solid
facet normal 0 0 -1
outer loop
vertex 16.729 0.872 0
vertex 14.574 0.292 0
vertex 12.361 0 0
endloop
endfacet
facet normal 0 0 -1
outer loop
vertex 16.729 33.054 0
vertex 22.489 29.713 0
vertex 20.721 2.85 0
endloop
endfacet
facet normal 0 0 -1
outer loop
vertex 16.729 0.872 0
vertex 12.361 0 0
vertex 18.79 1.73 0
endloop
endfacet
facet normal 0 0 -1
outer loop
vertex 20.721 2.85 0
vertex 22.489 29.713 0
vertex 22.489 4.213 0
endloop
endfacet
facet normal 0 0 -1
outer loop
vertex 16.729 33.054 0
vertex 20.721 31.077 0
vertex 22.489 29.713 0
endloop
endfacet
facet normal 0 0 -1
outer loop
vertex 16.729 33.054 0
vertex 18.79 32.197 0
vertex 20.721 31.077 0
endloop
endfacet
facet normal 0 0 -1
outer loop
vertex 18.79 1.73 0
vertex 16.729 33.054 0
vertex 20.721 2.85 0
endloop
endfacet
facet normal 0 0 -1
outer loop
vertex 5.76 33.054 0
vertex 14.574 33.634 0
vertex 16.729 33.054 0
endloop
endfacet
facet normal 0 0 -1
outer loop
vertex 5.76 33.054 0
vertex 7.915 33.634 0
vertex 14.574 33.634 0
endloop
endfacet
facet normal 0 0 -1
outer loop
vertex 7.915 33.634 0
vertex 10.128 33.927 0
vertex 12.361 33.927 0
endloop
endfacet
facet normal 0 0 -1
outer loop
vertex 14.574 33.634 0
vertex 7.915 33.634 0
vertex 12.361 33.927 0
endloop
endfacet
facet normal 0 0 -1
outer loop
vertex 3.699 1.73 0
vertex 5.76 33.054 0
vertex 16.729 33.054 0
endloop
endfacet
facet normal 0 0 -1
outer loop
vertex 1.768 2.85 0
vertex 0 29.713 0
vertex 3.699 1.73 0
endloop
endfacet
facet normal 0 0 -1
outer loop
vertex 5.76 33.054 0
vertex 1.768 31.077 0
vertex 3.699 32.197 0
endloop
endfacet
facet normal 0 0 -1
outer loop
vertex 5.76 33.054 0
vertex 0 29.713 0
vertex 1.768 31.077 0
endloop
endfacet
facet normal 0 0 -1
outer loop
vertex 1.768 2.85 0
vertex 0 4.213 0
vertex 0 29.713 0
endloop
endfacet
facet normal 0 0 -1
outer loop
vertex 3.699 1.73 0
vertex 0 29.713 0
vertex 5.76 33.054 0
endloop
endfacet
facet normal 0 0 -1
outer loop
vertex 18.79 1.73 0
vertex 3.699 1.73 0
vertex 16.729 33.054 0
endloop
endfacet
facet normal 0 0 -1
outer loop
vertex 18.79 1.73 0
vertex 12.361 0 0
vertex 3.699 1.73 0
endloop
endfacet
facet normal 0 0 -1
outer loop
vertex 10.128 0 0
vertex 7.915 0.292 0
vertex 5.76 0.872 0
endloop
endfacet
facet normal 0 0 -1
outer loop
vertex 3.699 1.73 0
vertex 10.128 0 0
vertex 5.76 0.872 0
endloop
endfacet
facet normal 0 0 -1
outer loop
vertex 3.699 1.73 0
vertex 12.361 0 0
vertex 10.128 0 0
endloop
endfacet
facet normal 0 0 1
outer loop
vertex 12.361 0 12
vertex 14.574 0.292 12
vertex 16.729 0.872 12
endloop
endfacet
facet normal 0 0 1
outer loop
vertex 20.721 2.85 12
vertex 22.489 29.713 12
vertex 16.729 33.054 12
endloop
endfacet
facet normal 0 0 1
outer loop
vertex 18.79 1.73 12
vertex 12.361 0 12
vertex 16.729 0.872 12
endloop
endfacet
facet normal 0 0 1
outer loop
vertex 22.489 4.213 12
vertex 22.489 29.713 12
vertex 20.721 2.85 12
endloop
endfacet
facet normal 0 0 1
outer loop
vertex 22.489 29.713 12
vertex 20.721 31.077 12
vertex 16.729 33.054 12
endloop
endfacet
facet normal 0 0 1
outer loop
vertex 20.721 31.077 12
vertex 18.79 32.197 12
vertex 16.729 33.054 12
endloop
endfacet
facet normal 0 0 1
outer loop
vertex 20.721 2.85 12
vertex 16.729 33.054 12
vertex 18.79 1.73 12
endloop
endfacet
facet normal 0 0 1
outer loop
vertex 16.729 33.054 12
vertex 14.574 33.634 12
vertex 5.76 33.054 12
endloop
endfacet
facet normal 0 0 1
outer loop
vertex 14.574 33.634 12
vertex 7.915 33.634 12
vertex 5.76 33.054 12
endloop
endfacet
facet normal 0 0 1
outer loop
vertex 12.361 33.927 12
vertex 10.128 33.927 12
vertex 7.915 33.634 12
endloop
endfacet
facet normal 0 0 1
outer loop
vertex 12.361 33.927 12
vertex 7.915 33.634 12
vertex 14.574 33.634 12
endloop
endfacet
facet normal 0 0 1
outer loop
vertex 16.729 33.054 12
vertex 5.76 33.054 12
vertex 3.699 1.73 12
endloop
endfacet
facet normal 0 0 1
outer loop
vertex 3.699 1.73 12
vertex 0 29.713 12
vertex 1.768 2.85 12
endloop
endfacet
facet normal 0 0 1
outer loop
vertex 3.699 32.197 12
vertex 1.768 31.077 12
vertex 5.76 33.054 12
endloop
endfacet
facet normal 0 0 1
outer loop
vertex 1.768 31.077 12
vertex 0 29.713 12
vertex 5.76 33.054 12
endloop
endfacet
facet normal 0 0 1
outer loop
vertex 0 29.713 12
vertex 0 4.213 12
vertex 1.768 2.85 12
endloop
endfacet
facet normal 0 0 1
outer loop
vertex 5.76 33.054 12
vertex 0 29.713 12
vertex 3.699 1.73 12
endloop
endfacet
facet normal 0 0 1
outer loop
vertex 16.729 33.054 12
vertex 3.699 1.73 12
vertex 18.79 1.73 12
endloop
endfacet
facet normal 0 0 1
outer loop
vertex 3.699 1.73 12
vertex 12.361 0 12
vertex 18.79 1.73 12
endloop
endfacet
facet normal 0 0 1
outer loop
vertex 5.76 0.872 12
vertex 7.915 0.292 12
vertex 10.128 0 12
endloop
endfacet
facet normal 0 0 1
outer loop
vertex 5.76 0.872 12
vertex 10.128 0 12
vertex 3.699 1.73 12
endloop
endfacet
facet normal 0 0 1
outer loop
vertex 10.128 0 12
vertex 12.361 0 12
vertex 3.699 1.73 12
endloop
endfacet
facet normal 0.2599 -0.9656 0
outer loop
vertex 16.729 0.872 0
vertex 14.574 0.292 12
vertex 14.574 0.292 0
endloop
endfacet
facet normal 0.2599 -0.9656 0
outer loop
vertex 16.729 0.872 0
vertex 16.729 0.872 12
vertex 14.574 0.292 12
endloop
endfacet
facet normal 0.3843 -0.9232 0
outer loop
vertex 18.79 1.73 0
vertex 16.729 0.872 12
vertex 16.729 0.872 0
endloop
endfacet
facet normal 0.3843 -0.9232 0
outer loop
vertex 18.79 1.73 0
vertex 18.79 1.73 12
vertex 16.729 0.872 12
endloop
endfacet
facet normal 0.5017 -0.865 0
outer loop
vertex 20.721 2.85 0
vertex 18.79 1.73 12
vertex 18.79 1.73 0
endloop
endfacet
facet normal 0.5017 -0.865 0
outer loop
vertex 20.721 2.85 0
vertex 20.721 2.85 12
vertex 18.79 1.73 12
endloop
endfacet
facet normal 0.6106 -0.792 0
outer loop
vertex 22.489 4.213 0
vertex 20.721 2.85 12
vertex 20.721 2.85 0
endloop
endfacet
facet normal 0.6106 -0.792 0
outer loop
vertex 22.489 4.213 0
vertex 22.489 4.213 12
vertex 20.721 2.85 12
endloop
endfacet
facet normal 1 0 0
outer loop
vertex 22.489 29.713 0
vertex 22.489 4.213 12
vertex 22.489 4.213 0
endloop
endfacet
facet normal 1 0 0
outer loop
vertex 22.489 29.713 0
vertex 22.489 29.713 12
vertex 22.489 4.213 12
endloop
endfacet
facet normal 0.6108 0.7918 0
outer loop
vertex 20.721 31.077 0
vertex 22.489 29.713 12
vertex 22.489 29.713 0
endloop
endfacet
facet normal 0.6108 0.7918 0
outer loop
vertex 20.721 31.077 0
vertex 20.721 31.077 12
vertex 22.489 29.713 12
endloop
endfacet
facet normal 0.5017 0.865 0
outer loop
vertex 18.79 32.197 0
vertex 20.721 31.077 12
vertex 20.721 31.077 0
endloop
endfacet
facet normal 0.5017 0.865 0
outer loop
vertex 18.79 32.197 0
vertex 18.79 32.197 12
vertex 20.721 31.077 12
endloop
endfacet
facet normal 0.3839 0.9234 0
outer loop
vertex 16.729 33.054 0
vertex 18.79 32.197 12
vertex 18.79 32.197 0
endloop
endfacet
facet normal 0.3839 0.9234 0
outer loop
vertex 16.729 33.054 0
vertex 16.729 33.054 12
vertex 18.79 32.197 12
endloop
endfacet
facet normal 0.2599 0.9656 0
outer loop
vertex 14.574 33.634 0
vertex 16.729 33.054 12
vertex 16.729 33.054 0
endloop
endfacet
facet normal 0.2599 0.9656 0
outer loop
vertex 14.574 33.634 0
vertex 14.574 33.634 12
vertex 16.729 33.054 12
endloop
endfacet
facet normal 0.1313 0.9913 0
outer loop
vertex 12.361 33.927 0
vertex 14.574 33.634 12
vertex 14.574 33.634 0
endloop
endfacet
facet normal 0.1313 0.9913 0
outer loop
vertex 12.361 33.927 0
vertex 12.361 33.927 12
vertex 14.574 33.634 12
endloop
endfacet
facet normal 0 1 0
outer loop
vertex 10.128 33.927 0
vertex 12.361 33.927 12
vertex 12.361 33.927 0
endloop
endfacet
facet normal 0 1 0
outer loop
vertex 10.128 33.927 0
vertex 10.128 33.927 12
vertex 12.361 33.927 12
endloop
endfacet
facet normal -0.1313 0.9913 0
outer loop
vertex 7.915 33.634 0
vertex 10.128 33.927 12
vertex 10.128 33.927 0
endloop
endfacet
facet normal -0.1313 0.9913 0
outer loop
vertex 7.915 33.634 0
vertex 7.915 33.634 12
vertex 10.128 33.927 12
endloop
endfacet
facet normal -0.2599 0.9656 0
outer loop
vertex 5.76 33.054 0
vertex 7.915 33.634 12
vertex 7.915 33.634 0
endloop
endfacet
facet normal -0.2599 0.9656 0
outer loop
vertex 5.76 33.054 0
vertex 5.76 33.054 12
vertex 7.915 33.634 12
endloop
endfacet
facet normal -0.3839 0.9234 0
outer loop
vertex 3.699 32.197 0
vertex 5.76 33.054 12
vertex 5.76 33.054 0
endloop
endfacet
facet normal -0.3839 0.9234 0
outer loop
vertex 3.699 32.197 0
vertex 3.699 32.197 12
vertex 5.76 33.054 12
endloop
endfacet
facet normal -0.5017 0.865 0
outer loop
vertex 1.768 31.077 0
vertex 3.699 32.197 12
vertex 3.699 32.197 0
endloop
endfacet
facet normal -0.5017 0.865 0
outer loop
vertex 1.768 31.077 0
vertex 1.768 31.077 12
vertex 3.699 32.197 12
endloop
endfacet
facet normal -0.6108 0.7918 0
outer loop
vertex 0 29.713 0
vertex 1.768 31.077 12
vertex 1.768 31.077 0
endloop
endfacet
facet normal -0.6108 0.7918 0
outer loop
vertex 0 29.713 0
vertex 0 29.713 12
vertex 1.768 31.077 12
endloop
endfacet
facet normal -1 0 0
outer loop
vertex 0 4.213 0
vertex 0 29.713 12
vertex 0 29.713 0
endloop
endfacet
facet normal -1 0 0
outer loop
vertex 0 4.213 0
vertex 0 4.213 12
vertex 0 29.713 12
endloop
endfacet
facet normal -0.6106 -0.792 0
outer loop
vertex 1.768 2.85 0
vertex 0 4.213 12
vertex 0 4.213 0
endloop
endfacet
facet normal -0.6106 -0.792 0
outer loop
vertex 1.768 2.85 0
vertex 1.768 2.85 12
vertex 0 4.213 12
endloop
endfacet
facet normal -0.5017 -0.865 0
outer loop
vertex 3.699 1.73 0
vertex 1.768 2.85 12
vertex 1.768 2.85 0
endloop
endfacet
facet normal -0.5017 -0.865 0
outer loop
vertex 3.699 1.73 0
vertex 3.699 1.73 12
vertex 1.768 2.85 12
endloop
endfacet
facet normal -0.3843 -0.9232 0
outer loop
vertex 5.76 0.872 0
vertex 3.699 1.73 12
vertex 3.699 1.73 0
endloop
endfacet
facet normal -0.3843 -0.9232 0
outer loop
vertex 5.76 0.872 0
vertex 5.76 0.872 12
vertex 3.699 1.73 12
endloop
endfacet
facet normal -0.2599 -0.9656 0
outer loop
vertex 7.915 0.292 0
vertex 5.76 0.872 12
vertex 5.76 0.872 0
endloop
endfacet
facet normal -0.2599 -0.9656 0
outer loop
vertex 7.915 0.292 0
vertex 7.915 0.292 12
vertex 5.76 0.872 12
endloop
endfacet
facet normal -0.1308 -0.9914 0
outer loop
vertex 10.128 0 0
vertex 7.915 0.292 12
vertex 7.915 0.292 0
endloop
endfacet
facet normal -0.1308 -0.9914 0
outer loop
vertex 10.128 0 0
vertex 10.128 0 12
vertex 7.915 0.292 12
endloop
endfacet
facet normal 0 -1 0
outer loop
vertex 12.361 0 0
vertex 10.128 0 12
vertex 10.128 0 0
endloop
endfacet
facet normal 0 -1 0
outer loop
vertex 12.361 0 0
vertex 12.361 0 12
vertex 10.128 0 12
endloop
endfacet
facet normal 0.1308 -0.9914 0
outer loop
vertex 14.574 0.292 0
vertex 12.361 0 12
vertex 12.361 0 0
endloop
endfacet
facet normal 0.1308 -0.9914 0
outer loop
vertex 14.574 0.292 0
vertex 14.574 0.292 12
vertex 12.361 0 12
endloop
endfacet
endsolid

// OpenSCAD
$fn = 32;

// ----------------------------------------------------------------------
// Eccentric disc: double_d, 12 mm thick
// ----------------------------------------------------------------------

// --- parameters (mm) ---
profile_height = 12;      // extrusion height
profile_points = 24;      // points of the closed outline

profile = [[22.489, 29.713], [20.721, 31.077], [18.79, 32.197], [16.729, 33.054], [14.574, 33.634], [12.361, 33.927], [10.128, 33.927], [7.915, 33.634], [5.76, 33.054], [3.699, 32.197], [1.768, 31.077], [0, 29.713], [0, 4.213], [1.768, 2.85], [3.699, 1.73], [5.76, 0.872], [7.915, 0.292], [10.128, 0], [12.361, 0], [14.574, 0.292], [16.729, 0.872], [18.79, 1.73], [20.721, 2.85], [22.489, 4.213]];  // single closed polygon, 24 points, counter clockwise

// --- the one profile operation ---
linear_extrude(height = profile_height) polygon(points = profile);
